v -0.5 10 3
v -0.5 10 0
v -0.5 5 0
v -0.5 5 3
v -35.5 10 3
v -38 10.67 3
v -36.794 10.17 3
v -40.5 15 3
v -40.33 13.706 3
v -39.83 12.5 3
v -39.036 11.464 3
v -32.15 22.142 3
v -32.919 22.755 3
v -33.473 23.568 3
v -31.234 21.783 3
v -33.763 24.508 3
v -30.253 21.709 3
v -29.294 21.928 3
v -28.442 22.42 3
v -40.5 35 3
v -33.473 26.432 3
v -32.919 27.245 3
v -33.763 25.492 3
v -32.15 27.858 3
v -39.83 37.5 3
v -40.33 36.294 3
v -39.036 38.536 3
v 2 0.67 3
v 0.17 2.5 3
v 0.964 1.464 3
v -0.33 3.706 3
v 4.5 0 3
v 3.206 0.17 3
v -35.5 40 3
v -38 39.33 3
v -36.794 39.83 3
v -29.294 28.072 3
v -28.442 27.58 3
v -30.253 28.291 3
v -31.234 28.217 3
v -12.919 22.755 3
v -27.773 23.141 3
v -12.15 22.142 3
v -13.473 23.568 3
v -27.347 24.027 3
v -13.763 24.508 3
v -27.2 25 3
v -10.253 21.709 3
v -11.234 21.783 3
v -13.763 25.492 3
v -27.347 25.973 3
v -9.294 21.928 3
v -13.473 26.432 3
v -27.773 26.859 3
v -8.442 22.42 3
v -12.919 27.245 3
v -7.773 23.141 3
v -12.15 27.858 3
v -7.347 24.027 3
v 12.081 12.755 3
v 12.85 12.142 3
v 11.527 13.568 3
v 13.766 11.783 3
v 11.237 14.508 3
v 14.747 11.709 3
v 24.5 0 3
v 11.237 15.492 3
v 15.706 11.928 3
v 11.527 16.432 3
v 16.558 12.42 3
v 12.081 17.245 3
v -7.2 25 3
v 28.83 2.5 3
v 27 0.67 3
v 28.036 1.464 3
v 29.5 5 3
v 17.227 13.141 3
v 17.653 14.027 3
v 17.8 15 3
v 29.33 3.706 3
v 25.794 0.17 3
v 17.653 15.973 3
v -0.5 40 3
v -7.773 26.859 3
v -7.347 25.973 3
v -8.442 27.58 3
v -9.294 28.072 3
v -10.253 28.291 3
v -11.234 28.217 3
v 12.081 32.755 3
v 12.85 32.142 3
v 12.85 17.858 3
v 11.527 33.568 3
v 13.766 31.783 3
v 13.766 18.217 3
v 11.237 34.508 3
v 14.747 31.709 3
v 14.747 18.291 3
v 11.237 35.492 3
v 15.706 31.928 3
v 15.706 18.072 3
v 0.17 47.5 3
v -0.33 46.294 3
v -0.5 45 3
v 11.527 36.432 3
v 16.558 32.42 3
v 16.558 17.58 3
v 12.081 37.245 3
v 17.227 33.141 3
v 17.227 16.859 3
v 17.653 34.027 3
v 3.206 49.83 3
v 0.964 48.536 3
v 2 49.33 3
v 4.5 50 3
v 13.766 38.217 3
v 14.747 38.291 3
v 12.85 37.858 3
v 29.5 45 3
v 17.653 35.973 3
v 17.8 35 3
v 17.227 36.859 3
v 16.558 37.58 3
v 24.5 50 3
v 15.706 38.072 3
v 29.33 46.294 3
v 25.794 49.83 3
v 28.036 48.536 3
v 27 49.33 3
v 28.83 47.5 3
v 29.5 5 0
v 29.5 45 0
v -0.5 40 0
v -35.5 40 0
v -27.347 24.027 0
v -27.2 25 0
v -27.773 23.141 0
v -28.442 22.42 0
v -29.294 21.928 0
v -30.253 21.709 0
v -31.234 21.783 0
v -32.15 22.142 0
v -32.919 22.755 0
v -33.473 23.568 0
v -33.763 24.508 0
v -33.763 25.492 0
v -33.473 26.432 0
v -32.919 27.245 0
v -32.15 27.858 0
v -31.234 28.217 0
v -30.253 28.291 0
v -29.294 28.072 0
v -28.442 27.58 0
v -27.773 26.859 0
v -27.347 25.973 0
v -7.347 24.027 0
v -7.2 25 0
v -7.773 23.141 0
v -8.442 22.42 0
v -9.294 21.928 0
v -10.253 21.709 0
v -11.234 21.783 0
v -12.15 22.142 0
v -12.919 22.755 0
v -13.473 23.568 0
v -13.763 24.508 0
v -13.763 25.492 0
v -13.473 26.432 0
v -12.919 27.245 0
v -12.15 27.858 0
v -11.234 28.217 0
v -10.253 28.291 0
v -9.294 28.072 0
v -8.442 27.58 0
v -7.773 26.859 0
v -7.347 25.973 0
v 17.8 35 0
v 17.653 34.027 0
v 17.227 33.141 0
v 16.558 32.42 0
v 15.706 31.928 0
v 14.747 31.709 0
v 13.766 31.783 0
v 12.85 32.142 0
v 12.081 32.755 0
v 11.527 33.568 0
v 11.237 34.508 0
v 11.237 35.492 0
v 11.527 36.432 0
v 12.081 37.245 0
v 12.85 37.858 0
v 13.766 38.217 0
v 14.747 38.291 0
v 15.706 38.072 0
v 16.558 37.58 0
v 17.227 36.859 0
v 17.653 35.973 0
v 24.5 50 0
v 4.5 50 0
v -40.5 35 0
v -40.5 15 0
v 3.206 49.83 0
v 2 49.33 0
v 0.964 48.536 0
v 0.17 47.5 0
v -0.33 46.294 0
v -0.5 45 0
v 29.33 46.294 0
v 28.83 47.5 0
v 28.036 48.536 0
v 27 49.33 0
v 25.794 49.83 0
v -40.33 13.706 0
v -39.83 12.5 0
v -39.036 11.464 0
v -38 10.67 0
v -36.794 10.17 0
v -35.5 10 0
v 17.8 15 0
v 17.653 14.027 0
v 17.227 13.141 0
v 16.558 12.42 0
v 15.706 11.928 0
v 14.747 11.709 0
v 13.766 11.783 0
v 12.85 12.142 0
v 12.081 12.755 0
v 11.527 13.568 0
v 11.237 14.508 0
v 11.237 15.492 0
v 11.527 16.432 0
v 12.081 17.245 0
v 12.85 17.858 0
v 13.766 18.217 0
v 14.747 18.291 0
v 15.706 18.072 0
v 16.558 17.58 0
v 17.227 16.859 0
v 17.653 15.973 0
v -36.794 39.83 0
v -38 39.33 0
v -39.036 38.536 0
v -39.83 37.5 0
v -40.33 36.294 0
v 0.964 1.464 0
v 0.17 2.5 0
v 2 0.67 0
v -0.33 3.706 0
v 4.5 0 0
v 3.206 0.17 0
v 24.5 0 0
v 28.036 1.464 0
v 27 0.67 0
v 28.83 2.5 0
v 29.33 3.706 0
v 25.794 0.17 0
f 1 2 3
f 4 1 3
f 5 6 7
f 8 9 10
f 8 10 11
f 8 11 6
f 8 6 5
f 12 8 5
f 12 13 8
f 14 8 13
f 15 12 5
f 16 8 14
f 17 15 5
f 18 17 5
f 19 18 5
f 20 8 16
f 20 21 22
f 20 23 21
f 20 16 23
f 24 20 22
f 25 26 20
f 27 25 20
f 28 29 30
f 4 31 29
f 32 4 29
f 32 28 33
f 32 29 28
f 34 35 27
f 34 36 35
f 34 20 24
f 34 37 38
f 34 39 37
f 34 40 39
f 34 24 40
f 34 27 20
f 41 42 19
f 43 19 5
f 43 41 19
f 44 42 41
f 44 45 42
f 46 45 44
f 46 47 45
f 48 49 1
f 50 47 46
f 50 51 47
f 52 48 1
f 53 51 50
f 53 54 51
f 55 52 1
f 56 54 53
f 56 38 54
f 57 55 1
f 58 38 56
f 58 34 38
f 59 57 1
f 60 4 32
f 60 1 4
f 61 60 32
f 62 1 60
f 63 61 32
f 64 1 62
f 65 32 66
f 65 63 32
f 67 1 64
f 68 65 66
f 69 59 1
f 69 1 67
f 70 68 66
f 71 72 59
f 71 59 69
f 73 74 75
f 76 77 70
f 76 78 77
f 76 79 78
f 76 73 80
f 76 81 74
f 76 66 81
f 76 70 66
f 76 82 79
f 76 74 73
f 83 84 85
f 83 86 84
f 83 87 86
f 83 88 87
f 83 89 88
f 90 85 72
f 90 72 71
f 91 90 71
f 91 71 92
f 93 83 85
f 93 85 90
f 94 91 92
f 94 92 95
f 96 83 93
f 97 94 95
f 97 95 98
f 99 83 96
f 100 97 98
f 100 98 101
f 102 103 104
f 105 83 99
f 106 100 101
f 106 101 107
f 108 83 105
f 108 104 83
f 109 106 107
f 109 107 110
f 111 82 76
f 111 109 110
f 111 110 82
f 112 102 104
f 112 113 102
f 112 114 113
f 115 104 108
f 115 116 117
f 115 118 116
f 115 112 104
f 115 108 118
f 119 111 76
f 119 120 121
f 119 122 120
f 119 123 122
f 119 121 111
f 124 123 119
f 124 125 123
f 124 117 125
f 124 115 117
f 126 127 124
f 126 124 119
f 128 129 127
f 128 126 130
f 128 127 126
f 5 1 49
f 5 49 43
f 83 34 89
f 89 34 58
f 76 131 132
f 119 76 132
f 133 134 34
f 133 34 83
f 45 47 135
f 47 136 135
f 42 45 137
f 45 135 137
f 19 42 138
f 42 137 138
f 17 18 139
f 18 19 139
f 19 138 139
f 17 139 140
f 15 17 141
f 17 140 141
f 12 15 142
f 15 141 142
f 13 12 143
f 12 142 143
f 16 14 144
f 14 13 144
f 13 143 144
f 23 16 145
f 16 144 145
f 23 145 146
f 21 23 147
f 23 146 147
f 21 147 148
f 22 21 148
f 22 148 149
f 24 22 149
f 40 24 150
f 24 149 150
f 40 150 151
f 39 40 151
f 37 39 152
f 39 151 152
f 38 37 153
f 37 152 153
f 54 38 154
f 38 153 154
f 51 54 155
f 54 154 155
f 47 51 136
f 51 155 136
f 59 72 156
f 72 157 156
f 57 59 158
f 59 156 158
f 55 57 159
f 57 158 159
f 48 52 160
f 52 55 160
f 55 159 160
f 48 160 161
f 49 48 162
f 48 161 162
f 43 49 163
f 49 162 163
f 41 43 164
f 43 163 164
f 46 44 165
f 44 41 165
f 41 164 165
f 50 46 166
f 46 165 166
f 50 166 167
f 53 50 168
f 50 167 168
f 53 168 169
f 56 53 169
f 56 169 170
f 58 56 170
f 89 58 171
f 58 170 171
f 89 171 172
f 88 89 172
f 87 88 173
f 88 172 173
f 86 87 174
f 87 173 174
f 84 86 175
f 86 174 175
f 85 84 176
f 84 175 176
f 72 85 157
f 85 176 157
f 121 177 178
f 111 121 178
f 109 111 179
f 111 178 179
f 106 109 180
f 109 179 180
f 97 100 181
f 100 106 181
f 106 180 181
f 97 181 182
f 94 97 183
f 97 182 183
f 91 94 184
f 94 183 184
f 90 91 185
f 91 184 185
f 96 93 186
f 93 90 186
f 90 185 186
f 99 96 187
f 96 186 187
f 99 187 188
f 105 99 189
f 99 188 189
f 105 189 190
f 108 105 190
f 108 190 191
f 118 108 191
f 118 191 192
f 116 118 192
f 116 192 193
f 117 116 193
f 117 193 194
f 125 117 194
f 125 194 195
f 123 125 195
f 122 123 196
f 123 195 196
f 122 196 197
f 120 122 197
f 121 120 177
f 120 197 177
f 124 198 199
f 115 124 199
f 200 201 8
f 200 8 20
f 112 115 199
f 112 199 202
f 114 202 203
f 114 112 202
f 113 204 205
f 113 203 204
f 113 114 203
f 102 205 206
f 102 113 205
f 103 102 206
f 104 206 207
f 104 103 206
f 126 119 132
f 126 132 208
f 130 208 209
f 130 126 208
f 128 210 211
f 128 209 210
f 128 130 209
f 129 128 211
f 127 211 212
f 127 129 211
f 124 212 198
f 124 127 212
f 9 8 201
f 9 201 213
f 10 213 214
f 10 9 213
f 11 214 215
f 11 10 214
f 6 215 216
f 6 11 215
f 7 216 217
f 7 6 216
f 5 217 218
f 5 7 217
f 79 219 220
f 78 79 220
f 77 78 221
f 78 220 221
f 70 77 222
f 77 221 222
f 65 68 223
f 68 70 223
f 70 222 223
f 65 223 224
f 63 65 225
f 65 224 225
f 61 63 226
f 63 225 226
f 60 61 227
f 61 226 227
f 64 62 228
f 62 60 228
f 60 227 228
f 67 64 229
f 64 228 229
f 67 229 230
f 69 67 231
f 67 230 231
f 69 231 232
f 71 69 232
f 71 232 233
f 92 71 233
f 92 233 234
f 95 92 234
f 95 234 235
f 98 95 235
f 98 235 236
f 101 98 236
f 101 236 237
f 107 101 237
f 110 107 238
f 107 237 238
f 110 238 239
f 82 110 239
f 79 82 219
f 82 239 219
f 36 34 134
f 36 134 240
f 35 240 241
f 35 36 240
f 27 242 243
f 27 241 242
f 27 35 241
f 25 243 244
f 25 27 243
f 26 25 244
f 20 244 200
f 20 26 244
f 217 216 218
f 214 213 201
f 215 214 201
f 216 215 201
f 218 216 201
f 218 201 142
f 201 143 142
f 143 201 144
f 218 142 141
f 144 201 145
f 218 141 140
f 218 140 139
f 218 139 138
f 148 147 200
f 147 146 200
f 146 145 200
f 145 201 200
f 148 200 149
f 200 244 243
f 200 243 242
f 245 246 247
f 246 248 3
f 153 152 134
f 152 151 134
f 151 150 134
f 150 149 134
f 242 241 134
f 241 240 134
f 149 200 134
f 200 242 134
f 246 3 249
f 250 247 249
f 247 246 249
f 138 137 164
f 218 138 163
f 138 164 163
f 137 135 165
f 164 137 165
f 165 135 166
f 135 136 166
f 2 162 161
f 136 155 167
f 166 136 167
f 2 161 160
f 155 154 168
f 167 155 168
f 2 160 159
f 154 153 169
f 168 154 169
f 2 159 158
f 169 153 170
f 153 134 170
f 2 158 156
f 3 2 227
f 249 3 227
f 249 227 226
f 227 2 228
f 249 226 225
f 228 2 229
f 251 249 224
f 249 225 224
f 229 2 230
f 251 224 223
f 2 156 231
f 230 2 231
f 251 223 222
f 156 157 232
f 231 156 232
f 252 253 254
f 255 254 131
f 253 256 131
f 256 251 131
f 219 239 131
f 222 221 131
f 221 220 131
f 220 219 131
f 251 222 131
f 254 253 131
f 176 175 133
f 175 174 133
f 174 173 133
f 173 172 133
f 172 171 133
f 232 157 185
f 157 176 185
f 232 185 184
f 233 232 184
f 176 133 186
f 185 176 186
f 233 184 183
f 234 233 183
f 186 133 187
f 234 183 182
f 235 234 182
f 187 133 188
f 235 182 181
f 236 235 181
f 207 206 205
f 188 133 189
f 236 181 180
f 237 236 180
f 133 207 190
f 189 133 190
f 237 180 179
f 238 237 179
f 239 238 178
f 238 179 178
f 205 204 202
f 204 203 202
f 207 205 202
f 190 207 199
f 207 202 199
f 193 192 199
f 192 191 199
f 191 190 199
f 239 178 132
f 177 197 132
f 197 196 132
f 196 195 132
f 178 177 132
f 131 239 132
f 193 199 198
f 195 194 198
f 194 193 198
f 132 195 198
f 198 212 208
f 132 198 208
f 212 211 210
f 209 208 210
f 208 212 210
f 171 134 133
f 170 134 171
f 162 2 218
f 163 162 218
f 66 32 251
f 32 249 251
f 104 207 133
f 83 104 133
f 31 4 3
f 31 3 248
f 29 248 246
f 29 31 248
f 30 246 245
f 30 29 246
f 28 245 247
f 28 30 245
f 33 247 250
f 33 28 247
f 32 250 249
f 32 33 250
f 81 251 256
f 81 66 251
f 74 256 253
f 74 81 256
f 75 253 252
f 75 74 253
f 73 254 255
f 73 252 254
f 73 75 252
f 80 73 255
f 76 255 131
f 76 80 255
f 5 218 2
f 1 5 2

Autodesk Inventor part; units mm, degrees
ref_plane "YZ Plane" through (0, 0, 0) normal (1, 0, 0) x (0, 1, 0)
ref_plane "XZ Plane" through (0, 0, 0) normal (0, 1, 0) x (-1, 0, 0)
ref_plane "作業平面1" through (0, 0, 0) normal (0, 0, 1) x (1, 0, 0)
sketch "スケッチ2" plane through (0, 0, 0) normal (0, 0, 1) x (1, 0, 0)
  line L0 (0, 0) -> (7.35, 0) construction
  line L1 (7.35, 0) -> (7.35, 50) construction
  line L2 (0, 50) -> (7.35, 50) construction
  line L3 (0, 0) -> (0, 50) construction
  line L4 (-0.5, 0) -> (-0.5, 50) construction
  line L5 (19.5, 0) -> (19.5, 50) construction
  line L6 (139.5, 0) -> (139.5, -3) construction
  line L7 (139.5, 0) -> (4.5, 0) construction
  line L8 (4.5, -3) -> (4.5, 0) construction
  line L9 (139.5, -3) -> (4.5, -3) construction
  line L10 (139.5, 53) -> (139.5, 50) construction
  line L11 (4.5, 53) -> (139.5, 53) construction
  line L12 (4.5, 50) -> (4.5, 53) construction
  line L13 (4.5, 50) -> (139.5, 50) construction
  line L14 (-0.632, 5) -> (-130.632, 5) construction
  line L15 (-0.632, 45) -> (-130.632, 45) construction
  line L16 (-40.5, 10) -> (-40.5, 40)
  line L17 (-40.5, 40) -> (-0.5, 40)
  line L18 (-0.5, 40) -> (-0.5, 5)
  circle A0 centre (14.5, 15) radius 3.3
  circle A1 centre (14.5, 35) radius 3.3
  circle A2 centre (-30.5, 25) radius 3.3
  circle A3 centre (-10.5, 25) radius 3.3
  line L19 (-40.5, 10) -> (-0.5, 10)
  line L20 (-0.5, 0) -> (29.5, 0)
  line L21 (29.5, 0) -> (29.5, 50)
  line L22 (29.5, 50) -> (-0.5, 50)
  line L23 (-0.5, 50) -> (-0.5, 0)
  point P0 (9.5, 35)
  point P1 (-0.5, 40)
  point P2 (-0.5, 5)
  dimension "d1" = 40
  dimension "d2" = 30
  dimension "d4" = 50
  dimension "d5" = 15
  dimension "d13" = 6.6
  dimension "d17" = 6.6
  dimension "d19" = 10
  dimension "d20" = 6.6
  dimension "d22" = 10
  dimension "d23" = 6.6
  dimension "d25" = 15
  dimension "d27" = 10
  dimension "d29" = 15
  dimension "d30" = 15
  dimension "d31" = 30
  dimension "d32" = 50
  dimension "d33" = 15
  dimension "d34" = 15
extrude "押し出し1" add sketch "スケッチ2" along normal blind 3
fillet "フィレット1" radius 5 6 edges at (-40.5, 10, 1.5) (-40.5, 40, 1.5) (-0.5, 0, 1.5) (29.5, 0, 1.5) (-0.5, 50, 1.5) (29.5, 50, 1.5)
equation "\"d22\" = d19"
equation "\"d23\" = d13"
equation "\"d27\" = -0.5 * d2 + 0.5 * d28"
equation "\"d29\" = 0.5 * d2"
equation "\"d30\" = d29"
equation "\"d33\" = 0.5 * d31"
equation "\"d34\" = d33"
equation "\"d28\" = 50"
properties part number "bogie_mount" material "アルミニウム 6061"
